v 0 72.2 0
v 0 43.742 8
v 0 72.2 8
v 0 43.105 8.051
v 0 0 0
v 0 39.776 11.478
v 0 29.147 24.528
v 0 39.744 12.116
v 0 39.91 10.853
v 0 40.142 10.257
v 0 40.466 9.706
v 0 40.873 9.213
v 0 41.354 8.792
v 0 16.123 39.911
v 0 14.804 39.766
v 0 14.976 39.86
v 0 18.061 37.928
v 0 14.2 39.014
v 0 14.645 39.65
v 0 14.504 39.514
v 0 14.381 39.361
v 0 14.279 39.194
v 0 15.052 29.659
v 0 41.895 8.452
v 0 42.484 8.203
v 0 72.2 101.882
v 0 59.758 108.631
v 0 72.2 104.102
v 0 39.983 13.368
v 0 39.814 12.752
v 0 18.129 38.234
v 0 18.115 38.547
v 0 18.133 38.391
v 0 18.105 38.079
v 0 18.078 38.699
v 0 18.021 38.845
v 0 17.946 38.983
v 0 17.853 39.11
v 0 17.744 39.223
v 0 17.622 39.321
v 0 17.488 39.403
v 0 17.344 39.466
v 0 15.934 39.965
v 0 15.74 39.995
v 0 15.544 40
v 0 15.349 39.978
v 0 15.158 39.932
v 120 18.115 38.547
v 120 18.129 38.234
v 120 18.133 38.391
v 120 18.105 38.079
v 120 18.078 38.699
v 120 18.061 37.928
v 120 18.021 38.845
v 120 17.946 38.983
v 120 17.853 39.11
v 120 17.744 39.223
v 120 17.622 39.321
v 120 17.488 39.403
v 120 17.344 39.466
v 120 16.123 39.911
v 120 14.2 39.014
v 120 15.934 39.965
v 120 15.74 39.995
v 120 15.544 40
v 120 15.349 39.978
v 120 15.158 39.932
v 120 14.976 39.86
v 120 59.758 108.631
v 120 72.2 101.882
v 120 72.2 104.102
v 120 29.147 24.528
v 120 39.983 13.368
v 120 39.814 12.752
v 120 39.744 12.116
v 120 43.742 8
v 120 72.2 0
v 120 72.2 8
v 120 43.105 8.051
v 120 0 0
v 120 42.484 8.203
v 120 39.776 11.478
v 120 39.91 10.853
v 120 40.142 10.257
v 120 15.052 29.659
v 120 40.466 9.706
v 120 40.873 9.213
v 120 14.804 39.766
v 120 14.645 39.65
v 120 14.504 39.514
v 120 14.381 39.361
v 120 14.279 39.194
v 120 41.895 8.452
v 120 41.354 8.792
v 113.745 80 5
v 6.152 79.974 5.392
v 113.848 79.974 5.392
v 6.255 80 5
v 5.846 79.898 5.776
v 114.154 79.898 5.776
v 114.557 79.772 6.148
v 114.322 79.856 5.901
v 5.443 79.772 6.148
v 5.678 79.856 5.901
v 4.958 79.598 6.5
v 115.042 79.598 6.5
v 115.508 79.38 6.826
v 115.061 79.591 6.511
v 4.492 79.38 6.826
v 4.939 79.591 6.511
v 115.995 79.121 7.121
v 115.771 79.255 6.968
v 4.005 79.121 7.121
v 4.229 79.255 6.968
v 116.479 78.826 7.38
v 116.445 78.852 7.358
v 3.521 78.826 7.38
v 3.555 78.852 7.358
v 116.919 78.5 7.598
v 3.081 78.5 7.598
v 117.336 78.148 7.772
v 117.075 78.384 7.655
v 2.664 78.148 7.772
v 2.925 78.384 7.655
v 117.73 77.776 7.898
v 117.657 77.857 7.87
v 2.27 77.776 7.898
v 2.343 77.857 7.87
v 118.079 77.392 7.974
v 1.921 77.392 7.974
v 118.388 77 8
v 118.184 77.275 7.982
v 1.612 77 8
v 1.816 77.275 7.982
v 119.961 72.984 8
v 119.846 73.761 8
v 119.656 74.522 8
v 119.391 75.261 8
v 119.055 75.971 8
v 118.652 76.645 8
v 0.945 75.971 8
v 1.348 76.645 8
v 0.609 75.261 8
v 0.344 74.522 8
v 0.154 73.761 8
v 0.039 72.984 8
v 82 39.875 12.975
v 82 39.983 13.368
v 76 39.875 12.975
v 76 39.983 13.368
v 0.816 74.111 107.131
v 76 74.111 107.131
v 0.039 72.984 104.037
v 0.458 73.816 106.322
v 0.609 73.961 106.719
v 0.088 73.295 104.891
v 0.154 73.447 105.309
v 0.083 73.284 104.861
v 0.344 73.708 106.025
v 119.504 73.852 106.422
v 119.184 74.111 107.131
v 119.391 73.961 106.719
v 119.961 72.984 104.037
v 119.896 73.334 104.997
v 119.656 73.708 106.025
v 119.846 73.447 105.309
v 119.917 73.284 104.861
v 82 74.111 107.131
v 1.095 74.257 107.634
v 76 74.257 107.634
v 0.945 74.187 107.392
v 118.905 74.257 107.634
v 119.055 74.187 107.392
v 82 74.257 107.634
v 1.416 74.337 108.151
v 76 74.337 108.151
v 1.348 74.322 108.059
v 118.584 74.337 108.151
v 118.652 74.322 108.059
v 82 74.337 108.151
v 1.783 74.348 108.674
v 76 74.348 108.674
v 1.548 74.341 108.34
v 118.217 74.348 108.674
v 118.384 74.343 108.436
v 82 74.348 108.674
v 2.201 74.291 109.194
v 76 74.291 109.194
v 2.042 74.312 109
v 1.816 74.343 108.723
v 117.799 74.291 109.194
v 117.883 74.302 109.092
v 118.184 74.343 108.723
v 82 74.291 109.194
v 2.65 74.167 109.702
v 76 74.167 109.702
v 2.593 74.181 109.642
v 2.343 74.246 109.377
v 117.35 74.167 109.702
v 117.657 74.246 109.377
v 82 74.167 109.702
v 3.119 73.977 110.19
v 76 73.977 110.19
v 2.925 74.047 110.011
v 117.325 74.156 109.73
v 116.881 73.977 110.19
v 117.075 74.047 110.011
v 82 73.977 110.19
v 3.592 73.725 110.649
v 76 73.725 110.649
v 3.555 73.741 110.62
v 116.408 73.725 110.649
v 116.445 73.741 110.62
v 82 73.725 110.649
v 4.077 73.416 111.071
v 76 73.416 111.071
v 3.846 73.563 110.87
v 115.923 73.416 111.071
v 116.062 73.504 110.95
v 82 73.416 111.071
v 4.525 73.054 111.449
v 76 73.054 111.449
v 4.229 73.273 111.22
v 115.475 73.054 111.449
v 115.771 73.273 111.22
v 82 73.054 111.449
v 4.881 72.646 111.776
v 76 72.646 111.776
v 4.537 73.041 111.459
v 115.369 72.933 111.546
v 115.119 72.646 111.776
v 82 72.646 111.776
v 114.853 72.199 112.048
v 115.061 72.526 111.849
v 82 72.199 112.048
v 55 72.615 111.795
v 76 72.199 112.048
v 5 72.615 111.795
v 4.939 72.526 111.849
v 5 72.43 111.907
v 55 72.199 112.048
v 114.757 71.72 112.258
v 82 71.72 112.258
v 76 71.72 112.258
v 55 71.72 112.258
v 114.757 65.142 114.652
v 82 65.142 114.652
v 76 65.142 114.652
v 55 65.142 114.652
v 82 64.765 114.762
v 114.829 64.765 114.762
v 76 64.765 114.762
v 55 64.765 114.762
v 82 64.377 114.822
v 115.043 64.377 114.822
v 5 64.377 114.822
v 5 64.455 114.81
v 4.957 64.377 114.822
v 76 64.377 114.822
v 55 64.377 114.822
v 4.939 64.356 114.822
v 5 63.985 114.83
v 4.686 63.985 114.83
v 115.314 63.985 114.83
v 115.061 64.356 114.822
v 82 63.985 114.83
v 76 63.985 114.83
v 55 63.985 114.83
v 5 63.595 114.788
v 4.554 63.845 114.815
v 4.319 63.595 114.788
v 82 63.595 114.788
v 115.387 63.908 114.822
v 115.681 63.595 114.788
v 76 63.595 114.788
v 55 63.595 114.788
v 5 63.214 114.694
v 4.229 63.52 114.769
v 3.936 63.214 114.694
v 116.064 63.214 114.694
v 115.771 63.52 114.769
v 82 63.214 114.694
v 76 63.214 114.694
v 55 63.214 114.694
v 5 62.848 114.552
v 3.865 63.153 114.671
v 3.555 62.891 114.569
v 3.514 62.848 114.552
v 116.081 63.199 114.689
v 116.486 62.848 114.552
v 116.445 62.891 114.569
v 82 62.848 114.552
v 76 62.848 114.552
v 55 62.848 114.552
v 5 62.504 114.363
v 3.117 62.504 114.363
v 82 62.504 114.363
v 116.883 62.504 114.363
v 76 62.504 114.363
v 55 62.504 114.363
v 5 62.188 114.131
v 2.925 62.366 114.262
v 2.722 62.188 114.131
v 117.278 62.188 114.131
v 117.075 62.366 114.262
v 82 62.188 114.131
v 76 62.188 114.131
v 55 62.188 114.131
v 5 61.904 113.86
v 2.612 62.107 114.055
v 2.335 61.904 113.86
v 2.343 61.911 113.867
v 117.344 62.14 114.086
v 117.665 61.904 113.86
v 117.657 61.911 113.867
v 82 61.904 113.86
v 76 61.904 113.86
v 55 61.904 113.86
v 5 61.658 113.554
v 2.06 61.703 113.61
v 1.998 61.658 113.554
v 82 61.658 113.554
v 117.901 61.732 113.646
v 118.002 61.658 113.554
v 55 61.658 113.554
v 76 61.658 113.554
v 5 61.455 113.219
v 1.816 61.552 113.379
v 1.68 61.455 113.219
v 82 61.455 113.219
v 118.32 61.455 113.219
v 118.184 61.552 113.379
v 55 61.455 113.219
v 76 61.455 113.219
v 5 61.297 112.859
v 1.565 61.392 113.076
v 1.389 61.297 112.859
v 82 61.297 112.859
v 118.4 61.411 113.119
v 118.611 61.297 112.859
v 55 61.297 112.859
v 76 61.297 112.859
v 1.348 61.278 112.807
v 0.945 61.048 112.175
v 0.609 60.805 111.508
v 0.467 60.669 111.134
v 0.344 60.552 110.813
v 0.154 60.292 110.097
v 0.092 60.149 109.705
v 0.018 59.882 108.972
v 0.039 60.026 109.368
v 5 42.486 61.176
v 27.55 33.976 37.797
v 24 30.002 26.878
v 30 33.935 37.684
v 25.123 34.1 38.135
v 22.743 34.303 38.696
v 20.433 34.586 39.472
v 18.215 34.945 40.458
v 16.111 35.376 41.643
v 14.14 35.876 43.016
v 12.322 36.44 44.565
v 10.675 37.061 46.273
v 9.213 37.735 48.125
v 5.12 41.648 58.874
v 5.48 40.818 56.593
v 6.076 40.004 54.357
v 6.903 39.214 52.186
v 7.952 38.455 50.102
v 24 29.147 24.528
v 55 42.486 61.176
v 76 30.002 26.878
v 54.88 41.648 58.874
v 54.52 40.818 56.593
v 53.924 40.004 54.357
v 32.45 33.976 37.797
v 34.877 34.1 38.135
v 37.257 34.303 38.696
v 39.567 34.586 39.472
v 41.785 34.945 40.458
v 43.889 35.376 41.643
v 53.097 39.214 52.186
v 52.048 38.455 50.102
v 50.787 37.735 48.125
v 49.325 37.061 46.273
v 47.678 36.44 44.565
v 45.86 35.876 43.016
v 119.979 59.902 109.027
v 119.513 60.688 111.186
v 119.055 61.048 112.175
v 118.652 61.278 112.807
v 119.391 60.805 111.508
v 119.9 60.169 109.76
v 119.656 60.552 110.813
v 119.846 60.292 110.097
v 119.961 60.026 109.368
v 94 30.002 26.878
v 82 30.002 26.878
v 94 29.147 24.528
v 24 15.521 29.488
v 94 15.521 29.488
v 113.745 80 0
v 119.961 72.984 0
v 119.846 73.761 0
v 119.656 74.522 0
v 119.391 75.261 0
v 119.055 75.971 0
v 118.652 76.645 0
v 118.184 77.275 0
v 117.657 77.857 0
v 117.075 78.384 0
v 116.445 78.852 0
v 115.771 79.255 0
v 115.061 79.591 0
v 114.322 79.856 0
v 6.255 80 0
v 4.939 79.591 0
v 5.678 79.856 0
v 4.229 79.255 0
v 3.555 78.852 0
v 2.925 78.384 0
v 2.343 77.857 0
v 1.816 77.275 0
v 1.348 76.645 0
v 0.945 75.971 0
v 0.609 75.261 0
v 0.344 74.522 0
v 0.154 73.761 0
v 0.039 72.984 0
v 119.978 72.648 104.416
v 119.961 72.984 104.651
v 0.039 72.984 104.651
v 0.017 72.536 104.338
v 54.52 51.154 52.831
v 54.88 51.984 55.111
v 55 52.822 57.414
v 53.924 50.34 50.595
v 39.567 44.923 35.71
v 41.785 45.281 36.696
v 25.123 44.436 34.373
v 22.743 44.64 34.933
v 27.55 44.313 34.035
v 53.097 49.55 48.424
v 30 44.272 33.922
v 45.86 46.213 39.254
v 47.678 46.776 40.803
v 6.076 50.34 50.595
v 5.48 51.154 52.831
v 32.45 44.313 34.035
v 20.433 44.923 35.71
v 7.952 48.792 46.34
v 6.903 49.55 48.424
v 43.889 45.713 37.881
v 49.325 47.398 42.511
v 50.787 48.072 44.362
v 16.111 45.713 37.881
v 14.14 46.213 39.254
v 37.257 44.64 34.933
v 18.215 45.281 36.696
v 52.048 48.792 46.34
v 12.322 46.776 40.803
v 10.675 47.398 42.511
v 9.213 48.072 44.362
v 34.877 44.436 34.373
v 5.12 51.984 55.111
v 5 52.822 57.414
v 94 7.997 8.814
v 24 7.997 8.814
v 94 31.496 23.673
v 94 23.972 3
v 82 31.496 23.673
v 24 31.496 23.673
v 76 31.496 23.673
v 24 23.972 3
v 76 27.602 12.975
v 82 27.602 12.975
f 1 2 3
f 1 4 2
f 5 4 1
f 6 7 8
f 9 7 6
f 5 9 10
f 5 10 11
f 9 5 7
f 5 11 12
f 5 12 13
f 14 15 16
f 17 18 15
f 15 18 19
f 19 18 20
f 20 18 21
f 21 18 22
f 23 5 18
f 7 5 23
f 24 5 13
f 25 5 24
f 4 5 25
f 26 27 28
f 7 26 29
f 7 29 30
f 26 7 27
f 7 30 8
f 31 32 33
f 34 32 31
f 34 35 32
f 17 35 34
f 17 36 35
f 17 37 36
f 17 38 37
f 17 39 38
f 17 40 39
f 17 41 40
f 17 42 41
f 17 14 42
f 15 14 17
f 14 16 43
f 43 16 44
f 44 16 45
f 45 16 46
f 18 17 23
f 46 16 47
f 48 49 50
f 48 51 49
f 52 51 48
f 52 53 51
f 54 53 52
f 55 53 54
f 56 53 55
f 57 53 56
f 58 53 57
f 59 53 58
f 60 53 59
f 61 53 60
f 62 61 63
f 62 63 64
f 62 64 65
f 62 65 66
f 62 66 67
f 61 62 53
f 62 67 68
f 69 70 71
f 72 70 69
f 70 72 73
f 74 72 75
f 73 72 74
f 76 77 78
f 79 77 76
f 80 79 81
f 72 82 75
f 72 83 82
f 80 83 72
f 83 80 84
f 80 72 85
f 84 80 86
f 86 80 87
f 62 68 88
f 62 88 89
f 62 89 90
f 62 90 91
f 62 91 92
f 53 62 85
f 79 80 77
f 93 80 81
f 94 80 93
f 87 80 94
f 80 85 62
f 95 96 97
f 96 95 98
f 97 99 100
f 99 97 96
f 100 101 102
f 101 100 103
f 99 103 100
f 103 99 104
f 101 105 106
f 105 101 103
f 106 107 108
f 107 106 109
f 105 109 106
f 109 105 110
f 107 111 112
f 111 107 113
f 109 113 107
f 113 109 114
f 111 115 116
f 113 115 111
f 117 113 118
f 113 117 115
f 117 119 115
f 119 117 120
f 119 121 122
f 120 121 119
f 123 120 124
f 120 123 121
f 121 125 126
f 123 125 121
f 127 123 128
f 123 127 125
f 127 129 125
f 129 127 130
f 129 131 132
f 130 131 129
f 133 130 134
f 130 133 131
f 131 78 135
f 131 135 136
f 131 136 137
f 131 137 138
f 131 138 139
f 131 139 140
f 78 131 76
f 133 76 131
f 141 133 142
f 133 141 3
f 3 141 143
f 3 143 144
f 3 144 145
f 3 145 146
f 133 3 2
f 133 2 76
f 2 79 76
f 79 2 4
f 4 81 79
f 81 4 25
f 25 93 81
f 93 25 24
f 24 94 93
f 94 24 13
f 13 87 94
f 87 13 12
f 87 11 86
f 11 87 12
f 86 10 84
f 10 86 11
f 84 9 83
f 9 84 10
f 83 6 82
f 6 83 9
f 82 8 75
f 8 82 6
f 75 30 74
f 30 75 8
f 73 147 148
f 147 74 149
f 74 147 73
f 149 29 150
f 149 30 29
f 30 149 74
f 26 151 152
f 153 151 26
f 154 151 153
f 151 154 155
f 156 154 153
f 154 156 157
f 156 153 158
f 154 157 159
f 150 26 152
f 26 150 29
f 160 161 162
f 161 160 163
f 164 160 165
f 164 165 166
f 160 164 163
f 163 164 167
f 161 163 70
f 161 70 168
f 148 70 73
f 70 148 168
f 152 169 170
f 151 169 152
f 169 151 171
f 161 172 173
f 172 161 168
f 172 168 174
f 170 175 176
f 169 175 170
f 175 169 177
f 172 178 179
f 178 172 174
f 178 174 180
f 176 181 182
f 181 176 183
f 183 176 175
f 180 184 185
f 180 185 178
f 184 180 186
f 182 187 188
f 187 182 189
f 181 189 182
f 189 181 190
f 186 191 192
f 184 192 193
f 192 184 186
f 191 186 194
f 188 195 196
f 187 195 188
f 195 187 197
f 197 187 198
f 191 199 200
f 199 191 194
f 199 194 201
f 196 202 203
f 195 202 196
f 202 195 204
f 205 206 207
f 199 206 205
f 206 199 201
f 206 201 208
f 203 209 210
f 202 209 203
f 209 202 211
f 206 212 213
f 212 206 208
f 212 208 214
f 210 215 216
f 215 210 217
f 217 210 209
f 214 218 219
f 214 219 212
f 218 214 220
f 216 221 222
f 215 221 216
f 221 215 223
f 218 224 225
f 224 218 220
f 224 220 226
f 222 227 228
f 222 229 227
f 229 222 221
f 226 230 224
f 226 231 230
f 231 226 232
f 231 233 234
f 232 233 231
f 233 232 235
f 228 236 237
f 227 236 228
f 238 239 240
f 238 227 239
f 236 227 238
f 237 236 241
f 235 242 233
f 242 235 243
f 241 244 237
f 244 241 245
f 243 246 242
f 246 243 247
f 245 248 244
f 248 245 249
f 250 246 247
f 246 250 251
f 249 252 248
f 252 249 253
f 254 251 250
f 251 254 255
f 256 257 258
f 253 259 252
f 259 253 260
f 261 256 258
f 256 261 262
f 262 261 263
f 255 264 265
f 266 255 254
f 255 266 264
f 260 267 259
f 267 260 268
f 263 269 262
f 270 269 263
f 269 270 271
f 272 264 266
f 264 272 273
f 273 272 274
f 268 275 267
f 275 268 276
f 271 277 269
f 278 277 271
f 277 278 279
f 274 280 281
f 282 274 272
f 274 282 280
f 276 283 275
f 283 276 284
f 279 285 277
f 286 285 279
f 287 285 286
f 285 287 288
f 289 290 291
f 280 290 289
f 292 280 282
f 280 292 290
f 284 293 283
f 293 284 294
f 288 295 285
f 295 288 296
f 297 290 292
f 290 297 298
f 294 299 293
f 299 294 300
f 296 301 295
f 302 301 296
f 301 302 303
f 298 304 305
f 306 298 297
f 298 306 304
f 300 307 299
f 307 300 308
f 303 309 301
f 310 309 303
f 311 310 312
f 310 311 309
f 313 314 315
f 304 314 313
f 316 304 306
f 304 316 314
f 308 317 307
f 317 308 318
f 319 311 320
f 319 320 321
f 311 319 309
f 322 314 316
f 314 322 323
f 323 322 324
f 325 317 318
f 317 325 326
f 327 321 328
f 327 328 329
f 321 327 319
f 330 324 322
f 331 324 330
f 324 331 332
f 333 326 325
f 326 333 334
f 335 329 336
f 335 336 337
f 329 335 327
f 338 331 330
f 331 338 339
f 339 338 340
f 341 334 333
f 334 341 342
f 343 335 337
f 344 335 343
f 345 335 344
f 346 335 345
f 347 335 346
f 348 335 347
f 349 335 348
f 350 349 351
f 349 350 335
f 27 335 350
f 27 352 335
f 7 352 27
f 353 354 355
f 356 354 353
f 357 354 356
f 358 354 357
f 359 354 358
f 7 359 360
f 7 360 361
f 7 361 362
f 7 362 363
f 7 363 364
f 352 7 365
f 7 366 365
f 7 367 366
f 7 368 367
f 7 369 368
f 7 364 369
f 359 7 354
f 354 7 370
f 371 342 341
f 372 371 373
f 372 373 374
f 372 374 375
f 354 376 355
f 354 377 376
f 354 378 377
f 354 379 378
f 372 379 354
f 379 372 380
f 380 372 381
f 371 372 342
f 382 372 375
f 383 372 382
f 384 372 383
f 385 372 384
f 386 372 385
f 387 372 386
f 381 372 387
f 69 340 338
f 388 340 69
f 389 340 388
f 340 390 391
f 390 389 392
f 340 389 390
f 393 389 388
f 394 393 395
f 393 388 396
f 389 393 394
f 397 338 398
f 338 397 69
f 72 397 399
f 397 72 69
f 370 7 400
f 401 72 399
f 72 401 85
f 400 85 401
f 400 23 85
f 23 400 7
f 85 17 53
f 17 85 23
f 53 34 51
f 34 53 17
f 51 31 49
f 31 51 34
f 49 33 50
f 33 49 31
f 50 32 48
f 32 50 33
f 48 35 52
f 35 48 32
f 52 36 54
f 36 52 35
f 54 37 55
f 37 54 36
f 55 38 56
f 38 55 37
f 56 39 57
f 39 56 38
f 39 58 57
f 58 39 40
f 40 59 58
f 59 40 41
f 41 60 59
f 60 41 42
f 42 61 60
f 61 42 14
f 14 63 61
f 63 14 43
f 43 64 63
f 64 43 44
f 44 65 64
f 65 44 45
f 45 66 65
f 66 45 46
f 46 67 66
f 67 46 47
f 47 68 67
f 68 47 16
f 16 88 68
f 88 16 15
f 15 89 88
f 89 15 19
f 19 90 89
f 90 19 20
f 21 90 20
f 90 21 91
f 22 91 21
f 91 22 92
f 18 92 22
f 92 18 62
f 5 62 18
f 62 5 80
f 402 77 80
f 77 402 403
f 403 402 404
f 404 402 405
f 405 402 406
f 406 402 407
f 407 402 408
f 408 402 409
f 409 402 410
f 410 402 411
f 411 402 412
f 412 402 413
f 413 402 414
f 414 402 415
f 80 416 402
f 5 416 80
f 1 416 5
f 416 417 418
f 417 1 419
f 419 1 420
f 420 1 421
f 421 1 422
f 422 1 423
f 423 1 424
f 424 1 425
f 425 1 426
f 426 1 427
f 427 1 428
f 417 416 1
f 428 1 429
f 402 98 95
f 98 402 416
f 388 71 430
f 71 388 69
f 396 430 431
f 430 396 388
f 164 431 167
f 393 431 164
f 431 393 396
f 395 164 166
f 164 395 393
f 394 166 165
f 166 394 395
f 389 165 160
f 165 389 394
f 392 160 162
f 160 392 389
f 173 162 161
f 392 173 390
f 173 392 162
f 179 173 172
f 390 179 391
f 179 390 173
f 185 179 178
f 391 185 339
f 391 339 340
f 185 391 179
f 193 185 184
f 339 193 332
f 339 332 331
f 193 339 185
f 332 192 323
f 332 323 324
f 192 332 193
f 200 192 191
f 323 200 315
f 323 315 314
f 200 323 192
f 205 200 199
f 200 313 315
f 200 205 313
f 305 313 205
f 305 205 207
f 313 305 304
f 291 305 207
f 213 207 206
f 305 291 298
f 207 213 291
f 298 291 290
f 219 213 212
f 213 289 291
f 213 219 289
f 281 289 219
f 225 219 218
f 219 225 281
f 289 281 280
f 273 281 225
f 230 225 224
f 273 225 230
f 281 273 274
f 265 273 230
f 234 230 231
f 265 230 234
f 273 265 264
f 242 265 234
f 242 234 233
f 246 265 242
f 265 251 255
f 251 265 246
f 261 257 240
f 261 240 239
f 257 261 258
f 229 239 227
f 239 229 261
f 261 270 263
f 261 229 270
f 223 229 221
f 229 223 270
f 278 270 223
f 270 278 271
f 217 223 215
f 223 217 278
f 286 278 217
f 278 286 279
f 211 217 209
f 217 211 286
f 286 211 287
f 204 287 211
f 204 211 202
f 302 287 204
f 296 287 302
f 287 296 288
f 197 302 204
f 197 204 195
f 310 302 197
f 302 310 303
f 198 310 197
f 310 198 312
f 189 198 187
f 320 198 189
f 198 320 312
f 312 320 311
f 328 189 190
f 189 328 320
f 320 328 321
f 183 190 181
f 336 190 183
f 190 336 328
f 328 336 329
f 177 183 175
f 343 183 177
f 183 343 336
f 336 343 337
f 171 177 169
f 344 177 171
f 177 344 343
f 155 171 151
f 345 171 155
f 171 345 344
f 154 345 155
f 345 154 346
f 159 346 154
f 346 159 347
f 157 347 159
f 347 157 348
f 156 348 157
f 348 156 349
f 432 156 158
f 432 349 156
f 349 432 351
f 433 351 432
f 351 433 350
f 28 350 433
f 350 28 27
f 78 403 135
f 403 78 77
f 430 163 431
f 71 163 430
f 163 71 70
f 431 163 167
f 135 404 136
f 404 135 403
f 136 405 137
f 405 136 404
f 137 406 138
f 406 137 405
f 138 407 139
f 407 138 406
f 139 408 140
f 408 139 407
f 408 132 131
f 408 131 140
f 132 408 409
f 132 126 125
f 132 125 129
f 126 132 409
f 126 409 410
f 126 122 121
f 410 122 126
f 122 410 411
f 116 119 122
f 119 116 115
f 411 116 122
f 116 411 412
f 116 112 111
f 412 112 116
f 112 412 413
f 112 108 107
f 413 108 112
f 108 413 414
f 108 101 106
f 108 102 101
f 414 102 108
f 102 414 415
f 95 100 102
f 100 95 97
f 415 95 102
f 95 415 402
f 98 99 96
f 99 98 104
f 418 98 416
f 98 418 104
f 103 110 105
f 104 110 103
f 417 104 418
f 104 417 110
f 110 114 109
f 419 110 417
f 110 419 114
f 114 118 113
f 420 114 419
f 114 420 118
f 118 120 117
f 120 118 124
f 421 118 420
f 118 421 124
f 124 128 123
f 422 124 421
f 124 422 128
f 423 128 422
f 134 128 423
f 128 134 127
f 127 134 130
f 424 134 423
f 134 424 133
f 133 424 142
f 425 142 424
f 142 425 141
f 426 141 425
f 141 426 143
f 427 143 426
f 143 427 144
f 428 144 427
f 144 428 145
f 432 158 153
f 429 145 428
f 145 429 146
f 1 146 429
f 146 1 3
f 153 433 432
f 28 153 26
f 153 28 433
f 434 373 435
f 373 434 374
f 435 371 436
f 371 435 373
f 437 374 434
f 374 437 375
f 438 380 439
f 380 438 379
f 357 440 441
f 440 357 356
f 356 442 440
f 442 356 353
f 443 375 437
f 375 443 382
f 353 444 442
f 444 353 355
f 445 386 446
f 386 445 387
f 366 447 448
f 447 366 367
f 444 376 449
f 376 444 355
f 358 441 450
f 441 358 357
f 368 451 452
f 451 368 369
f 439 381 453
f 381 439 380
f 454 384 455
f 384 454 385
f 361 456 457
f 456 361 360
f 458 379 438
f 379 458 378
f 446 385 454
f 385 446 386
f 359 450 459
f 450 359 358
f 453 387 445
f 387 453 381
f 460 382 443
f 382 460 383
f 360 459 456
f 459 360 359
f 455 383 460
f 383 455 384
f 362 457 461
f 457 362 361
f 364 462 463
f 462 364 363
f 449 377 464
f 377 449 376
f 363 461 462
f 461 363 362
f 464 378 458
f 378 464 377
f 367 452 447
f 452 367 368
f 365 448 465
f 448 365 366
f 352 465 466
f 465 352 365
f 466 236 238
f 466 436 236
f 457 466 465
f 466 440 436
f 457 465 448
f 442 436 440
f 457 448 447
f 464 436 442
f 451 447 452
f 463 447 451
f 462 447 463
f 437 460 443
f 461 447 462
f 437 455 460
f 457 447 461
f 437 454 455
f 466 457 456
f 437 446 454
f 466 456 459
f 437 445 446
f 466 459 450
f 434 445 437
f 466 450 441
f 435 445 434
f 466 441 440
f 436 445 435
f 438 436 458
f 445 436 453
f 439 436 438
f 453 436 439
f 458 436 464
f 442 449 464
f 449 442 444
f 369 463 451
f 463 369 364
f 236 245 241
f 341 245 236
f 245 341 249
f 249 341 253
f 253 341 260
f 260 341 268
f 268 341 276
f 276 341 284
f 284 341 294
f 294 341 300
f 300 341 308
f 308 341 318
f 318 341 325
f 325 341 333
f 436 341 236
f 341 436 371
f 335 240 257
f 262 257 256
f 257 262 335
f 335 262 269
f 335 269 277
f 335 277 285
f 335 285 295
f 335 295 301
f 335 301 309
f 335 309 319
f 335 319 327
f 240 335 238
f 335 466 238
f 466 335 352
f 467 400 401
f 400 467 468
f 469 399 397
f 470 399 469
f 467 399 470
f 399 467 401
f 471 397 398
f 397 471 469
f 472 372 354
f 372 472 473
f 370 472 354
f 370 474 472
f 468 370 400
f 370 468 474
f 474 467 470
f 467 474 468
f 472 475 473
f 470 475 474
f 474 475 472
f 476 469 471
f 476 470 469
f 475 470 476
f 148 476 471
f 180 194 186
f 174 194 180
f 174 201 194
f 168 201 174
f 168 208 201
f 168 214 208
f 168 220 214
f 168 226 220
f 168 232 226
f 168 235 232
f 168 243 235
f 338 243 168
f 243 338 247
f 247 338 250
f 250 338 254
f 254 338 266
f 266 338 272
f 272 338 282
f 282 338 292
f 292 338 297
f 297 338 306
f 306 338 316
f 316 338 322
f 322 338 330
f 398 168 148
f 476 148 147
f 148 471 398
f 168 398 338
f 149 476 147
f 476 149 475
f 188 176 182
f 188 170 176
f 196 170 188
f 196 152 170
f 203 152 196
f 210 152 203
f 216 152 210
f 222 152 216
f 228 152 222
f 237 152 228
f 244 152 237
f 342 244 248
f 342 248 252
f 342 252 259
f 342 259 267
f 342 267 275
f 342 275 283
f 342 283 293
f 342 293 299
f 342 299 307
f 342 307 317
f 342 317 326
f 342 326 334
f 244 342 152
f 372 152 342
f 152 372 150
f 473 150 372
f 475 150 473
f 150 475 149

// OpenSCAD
// Ladeständer für PocketBook Era Color (mit Hülle + Popsocket), Gerät quer,
// Ladebuchse unten, gewinkelter USB-C-Stecker hängt frei in einem Schacht
// Alle Maße in Millimetern (Regel: units-mm)
//
// Änderungen gegenüber _001 (QA-Befunde + Nutzerwunsch "abgerundete Ecken"):
//   - Befund 1: Kante hinten am Schacht (Stütze hing 2.5 mm über) mit 45° im
//     Gerätesystem angefast -> ~25° aus der Senkrechten, kein Überhang mehr.
//   - Befund 2: back_h 95 -> 97, damit R10 auch senkrecht gilt (97 * sin70 = 91.2).
//   - Befund 3/4: Reserve. shaft_d 20 -> 22, Popsocket-Luft seitlich/unten
//     3 -> 5 (Tasche 50 breit), hinten 2 -> 4 (Tasche 11 tief), dafür
//     back_t 12 -> 14 (Rest hinter der Tasche bleibt 3). Tasche unten rund
//     (U-Form, folgt dem Popsocket).
//   - Befund 6: Ständermasse zieht Schacht, Kanal und Tasche ab (vorher nur
//     die volle Profilfläche).
//   - Abgerundet: Profilecken (Lippe oben, Stützenkopf, Fußplatte hinten,
//     Hohlkehle Stütze/Fußplatte), Stützenkopf seitlich (Vorderansicht),
//     hintere Ecken der Fußplatte (Draufsicht). Nicht gerundet: Kanten am
//     Bett (kein Überhang am Fuß) und die Auflage/Schlitzecken (dort sitzt
//     die Gerätekante).
//
// Kontext (Regel: context-first):
//   - context/printer.md:    Anycubic Kobra S1, 0.4mm Düse, PEI, 250mm Bauraum
//   - context/tolerances.md: kein Passsitz im Teil. Geräteschlitz bewusst
//                            locker (+1 mm/Seite), Stecker/Kabel mit viel Luft.
//   - context/materials.md:  PLA, Rechenwerte (Dichte 1.24, Füllung ~0.6)
//
// ---------------------------------------------------------------------------
// ANFORDERUNGSTABELLE (Design-Gespräch, vom Nutzer bestätigt)
// ---------------------------------------------------------------------------
// | ID  | Anforderung                         | Soll                                   | Quelle        | Prüfmethode                          |
// |-----|-------------------------------------|----------------------------------------|---------------|--------------------------------------|
// | R1  | Gerät quer: 162 br. x 145 h x 13 d  | Aufnahme passend, Gerät darf seitlich   | 145 gemessen, | Bounding Box, Schnitte               |
// |     |                                     | überstehen                             | 162 geschätzt,|                                      |
// |     |                                     |                                        | 13 ca. gem.   |                                      |
// | R2  | Schlitz für die Dicke               | 15 mm (+1/-0), locker                  | ca. gemessen  | Schnitt quer                         |
// | R3  | Neigung                             | 70° ±1° gegen den Tisch                | Nutzer        | Schnitt quer, Winkel                 |
// | R4  | Gerät auf zwei Auflagen, nicht auf  | Schacht unter der Buchse 70 mm lang (X)| angenommen    | Schnitt z = Auflagehöhe              |
// |     | dem Stecker                         | x 17 mm tief (quer zum Gerät)          |               |                                      |
// | R5  | Buchsenposition                     | Mitte ~80 mm vom linken Ende, mittig   | geschätzt     | Schacht zentriert darauf             |
// |     |                                     | in der Dicke                           |               |                                      |
// | R6  | Freiraum Winkelstecker              | Schachttiefe unter dem Gerät >= 20 mm  | angenommen    | Schnitt, Kollisionsteil Stecker      |
// |     |                                     | (Stecker ~15 lang, 12 x 7)             |               |                                      |
// | R7  | Kabelkanal oben offen, nach hinten  | Breite >= 5 mm, Kabel von oben einlegbar| angenommen   | Schnitt, Sichtprüfung                |
// | R8  | Popsocket frei: Ø40 x 7, Mitte 39   | Aussparung >= Ø46, Tiefe >= 9          | geschätzt     | Schnitt, Kollisionsteil              |
// |     | über Unterkante, 51 vom linken Ende |                                        |               |                                      |
// | R9  | Lippe vorne hält die Unterkante     | ~10 mm hoch                            | angenommen    | Schnitt quer                         |
// | R10 | Rückenstütze trägt über dem Schwer- | Anlage bis >= 90 mm über Unterkante    | angenommen    | Schnitt quer                         |
// |     | punkt                               |                                        |               |                                      |
// | R11 | Kippsicher, nur Laden               | Kippwinkel vorne und hinten >= 15°,    | angenommen    | echo(), load-case-check              |
// |     |                                     | mit 330 g                              |               |                                      |
// | R12 | PLA, ohne Stützen druckbar          | Überhang <= 45°, Wände >= 0.8 mm       | Nutzer        | G4                                   |
// | R13 | Druckraum                           | <= 250 x 250 x 250                     | Drucker       | Bounding Box                         |
// | R14 | Teile im print                      | 1 Volumen                              | -             | check.py Volumes                     |
// | R15 | Passtest                            | Teil fit_test: Sockelausschnitt mit    | -             | Druck vor dem ganzen Teil            |
// |     |                                     | Schacht, Kanal, Auflagen               |               |                                      |
// | R16 | Abgerundete Ecken (Nutzer, _002)    | sichtbare Außenecken gerundet, Bett-   | Nutzer        | Sichtprüfung (G3), Schnitt quer      |
// |     |                                     | kanten und Auflage/Schlitz scharf      |               |                                      |
//
// Stecker: UGREEN 60W USB-C Winkel 90°. Herstellermaße nicht gefunden ->
// plug_* und cable_d sind ANNAHMEN. Annahme: das Kabel geht parallel zur
// Geräteunterkante ab (X). Steckerseite so wählen, dass es nach rechts
// (zum Kanal) abgeht – USB-C ist verdrehbar.
//
// ---------------------------------------------------------------------------
// Koordinaten
// ---------------------------------------------------------------------------
// X = Breite (x = 0 am linken Ende des Geräts, von vorne gesehen),
// Y = Tiefe (y = 0 Vorderkante Fuß, +Y nach hinten), Z = Höhe.
// Gerätesystem (n, u): u entlang der Gerätefläche nach oben (um tilt nach
// hinten geneigt), n senkrecht dazu nach hinten. Ursprung O = Schnitt von
// Lippen-Innenseite und Auflage. Der Schlitz reicht von n = 0 (Lippe) bis
// n = slot_w (Rückenstütze); das Gerät lehnt an der Stütze.
//
// Aufbau: ein Profil in (Y, Z), über stand_w in X extrudiert:
//   Fuß vorne (massiv unter dem Schlitz), Lippe, Auflage senkrecht zur
//   Gerätefläche, geneigte Rückenstütze als Platte, flache Fußplatte nach
//   hinten. Ausgeschnitten: Steckerschacht unter der Buchse, Kabelkanal
//   (oben offen) nach hinten, Popsocket-Tasche (oben offen) in der Stütze.
//
// Druckausrichtung (part = "print"): so wie er steht, Fußunterseite aufs
// Bett. Keine Brücken (Schacht, Kanal und Tasche sind oben offen). Stärkster
// Überhang: Lippen-Innenseite und Rückseite der Stütze, je tilt = 20° aus
// der Senkrechten.
//
// LASTFÄLLE (rule load-case-check): Das Teil wird nicht bedient, nur
// abgestellt. Bruch unkritisch (330 g auf ~12 mm PLA-Platte, Spannungen
// << 1 MPa). Rutschen unkritisch (Lippe hält formschlüssig). Maßgebend ist
// Kippen, nach hinten (Anstoßen an der Geräteoberkante). echo() unten.

/* [Gerät] */
// Breite quer (lange Kante, mit Hülle) – GESCHÄTZT
dev_w = 162;
// Höhe quer (kurze Kante, mit Hülle) – gemessen
dev_h = 145;
// Dicke mit Hülle, ohne Popsocket – ca. gemessen
dev_t = 13;
// Masse Gerät + Hülle in g – ANNAHME (nur echo)
dev_mass_g = 330;

/* [Popsocket (Rückseite, eingeklappt)] */
pop_d = 40;
pop_h = 7;
// Mitte vom linken Ende (Frontansicht)
pop_x = 51;
// Mitte über der Geräteunterkante
pop_u = 39;
// Luft ringsum in der Tasche
pop_clear = 5;
// Luft hinter dem Popsocket
pop_clear_back = 4;

/* [Buchse und Winkelstecker – ANNAHMEN] */
// Buchsenmitte vom linken Ende
port_x = 80;
// Steckergehäuse: Breite (X), Dicke (n), Länge aus dem Gerät
plug_w = 12;
plug_t = 7;
plug_l = 15;
cable_d = 4;

/* [Ständer] */
// Neigung gegen den Tisch
stand_angle = 70;
// Luft im Schlitz gesamt (Schlitz = dev_t + slot_clear)
slot_clear = 2;
// Breite des Ständers (X), mittig unter dem Gerät
stand_w = 120;
// Lippe vorne: Dicke, Höhe über der Auflage
lip_t = 4;
lip_h = 10;
// Rückenstütze: Anlagehöhe über der Auflage, Plattendicke
back_h = 97;
back_t = 14;
// Fußplatte hinten: Gesamttiefe des Fußes, Höhe
base_d = 80;
base_h = 8;
// Boden unter dem tiefsten Punkt des Schachts
floor_t = 3;

/* [Schacht und Kanal] */
shaft_l = 70;
shaft_w = 17;
shaft_d = 22;
// Kanal nach hinten: X-Position (rechts neben dem Stecker, Platz zum Biegen)
channel_x = 100;
channel_w = 6;

/* [Ansicht] */
part = "print"; // [print, stand, fit_test, assembly, interference]

/* [Hidden] */
nozzle = 0.4;
min_w = 2 * nozzle;
bed = 250;
rho_pla = 1.24;   // g/cm³
fill = 0.6;       // effektive Füllung für Massenschätzung
eps = 0.01;
col_stand = "MidnightBlue";
$fn = 64;

tilt = 90 - stand_angle;       // Neigung aus der Senkrechten
s = sin(tilt);
c = cos(tilt);
slot_w = dev_t + slot_clear;
n_dev0 = slot_w - dev_t;       // Gerät lehnt an der Stütze
n_plug = n_dev0 + dev_t / 2;   // Buchse mittig in der Dicke
// Schachtvorderwand nie genau in der Ebene der Lippen-Innenseite (n = 0):
// koplanare Flächen ergeben Null-Dreiecke in der STL (F7)
shaft_n0 = max(n_plug - shaft_w / 2, 0.5);
shaft_n1 = shaft_n0 + shaft_w;
n_rear = slot_w + back_t;      // Rückseite der Stütze
sx0 = (dev_w - stand_w) / 2;   // Ständer mittig unter dem Gerät
sx1 = sx0 + stand_w;

// Ursprung O: tiefster Schachtpunkt (n = shaft_n1, u = -shaft_d) liegt auf
// z = floor_t; Lippen-Vorderkante trifft den Tisch bei y = 0.
Oz = floor_t + shaft_n1 * s + shaft_d * c;
u_a = -(Oz + lip_t * s) / c;
Oy = lip_t * c - u_a * s;

function F(n, u) = [Oy + n * c + u * s, Oz - n * s + u * c];

u_J = (base_h - Oz + n_rear * s) / c;   // Stützen-Rückseite trifft Fußplatte
PROFILE = [
    [0, 0], [base_d, 0], [base_d, base_h],
    F(n_rear, u_J), F(n_rear, back_h), F(slot_w, back_h),
    F(slot_w, 0), F(0, 0), F(0, lip_h), F(-lip_t, lip_h)
];
// Eckradien je Profilpunkt (R16). 0 = scharf: Bettkanten (kein Überhang)
// und Auflage/Schlitz (dort sitzt die Gerätekante). J = Hohlkehle.
//            A  R1 R2 J  H  G  E  D  C    B
PROFILE_RAD = [0, 0, 3, 4, 4, 3, 0, 0, 1.2, 1.5];
// Seitliche Rundung Stützenkopf (Vorderansicht), hintere Fußecken (Draufsicht)
top_corner_r = 8;
foot_corner_r = 8;

// Ecke i mit Radius r durch einen Kreisbogen ersetzen (konvex und konkav)
function unit(v) = v / norm(v);
function round_corner(P, i, r, k = 12) =
    let(a = P[(i - 1 + len(P)) % len(P)], p = P[i], b = P[(i + 1) % len(P)],
        u1 = unit(a - p), u2 = unit(b - p),
        th = acos(u1 * u2) / 2,
        t = r / tan(th),
        C = p + unit(u1 + u2) * r / sin(th),
        T1 = p + u1 * t, T2 = p + u2 * t,
        a1 = atan2(T1[1] - C[1], T1[0] - C[0]),
        a2 = atan2(T2[1] - C[1], T2[0] - C[0]),
        d0 = a2 - a1,
        d = d0 > 180 ? d0 - 360 : (d0 < -180 ? d0 + 360 : d0))
    [for (j = [0 : k]) C + r * [cos(a1 + d * j / k), sin(a1 + d * j / k)]];
// Tangentenlänge je Ecke, für die Kontrolle "Radien passen auf die Kante"
function tan_len(P, i, r) =
    let(a = P[(i - 1 + len(P)) % len(P)], p = P[i], b = P[(i + 1) % len(P)])
    r / tan(acos(unit(a - p) * unit(b - p)) / 2);
function round_poly(P, R) =
    [for (i = [0 : len(P) - 1]) each (R[i] > 0 ? round_corner(P, i, R[i]) : [P[i]])];
PROFILE_R = round_poly(PROFILE, PROFILE_RAD);

// Kabel verlässt den Stecker knapp über dessen Ende, Kanalboden darunter
cab_u = -plug_l + cable_d / 2 + 1;
cab_P = F(n_plug, cab_u);
channel_z0 = cab_P[1] - cable_d / 2 - 0.5;
channel_y0 = F(0, lip_h)[0] + 0.5;      // hinter der Lippe, schneidet sie nicht

pocket_w = pop_d + 2 * pop_clear;
pocket_dep = pop_h + pop_clear_back;
pocket_x0 = pop_x - pocket_w / 2;
pocket_x1 = pop_x + pocket_w / 2;

// Polygonfläche und Schwerpunkt (Shoelace)
function sumv(v, i = 0) = i >= len(v) ? 0 : v[i] + sumv(v, i + 1);
function cr(P, i) = let(a = P[i], b = P[(i + 1) % len(P)]) a[0] * b[1] - b[0] * a[1];
function parea(P) = sumv([for (i = [0 : len(P) - 1]) cr(P, i)]) / 2;
function pcent(P) = let(A = parea(P)) [
    sumv([for (i = [0 : len(P) - 1]) (P[i][0] + P[(i + 1) % len(P)][0]) * cr(P, i)]) / (6 * A),
    sumv([for (i = [0 : len(P) - 1]) (P[i][1] + P[(i + 1) % len(P)][1]) * cr(P, i)]) / (6 * A)];
// Polygon an der Halbebene p[ax] >= k abschneiden (Sutherland-Hodgman)
function clip_ge(P, ax, k) =
    [for (i = [0 : len(P) - 1])
        let(p = P[i], q = P[(i + 1) % len(P)], pin = p[ax] >= k, qin = q[ax] >= k)
        each concat(pin ? [p] : [],
                    pin != qin ? [p + (q - p) * ((k - p[ax]) / (q[ax] - p[ax]))] : [])];

// Schacht mit 45°-Fase (Gerätesystem n, u): Rechteck unter der Auflage plus
// Dreieck hinten, das die überstehende Stützenkante abträgt (QA-Befund 1)
ch_d = shaft_n1 - slot_w;   // Überstand der Stütze über dem Schacht
SHAFT_NU = [[shaft_n0, -shaft_d], [shaft_n1, -shaft_d], [shaft_n1, 0],
            [slot_w, ch_d], [shaft_n0, ch_d]];
// Anteil des Schachts, der im Material liegt (ohne den leeren Schlitz)
SHAFT_MAT = [for (p = [[shaft_n0, -shaft_d], [shaft_n1, -shaft_d], [shaft_n1, 0],
                       [slot_w, ch_d], [slot_w, 0], [shaft_n0, 0]]) F(p[0], p[1])];

// ---------------------------------------------------------------------------
// Kontrollen
// ---------------------------------------------------------------------------
assert(abs(slot_w - 15) <= 1 && slot_w >= 15, str("R2: Schlitz ", slot_w));
assert(stand_angle >= 60 && stand_angle <= 80, "Neigung unplausibel");
assert(stand_w <= dev_w, "R1: Ständer breiter als das Gerät");
assert(shaft_n0 >= -eps && shaft_n1 <= n_rear - min_w, "Schacht ragt aus Lippe/Stütze");
assert(shaft_d >= plug_l + 5, str("R6: Schacht zu flach für den Stecker: ", shaft_d));
assert(shaft_w >= plug_t + 2 * 2 && shaft_w >= cable_d + 2 * 2, "Schacht zu schmal");
assert(port_x - shaft_l / 2 >= sx0 + 10 && port_x + shaft_l / 2 <= sx1 - 10,
       "R4: Auflagen neben dem Schacht < 10 mm");
assert(shaft_l / 2 - plug_w / 2 >= 8, "R5: Schacht deckt Lageunsicherheit ±8 nicht ab");
assert(channel_x + channel_w / 2 <= port_x + shaft_l / 2 - 2, "Kanal liegt nicht am Schacht");
assert(channel_x - channel_w / 2 >= port_x + plug_w / 2 + 4, "Kanal zu nah am Stecker (Biegung)");
assert(channel_w >= cable_d + 1 && channel_w >= 5, "R7: Kanal zu schmal");
assert(channel_z0 >= floor_t, str("Kanalboden unter Bodenstärke: ", channel_z0));
assert(pocket_x0 >= sx0 + 2 * min_w, "Popsocket-Tasche schneidet die linke Ständerkante");
assert(pocket_x1 <= channel_x - channel_w / 2 - 2 * min_w, "Tasche zu nah am Kanal");
assert(back_t - pocket_dep >= 2 * min_w, str("Rest hinter der Tasche: ", back_t - pocket_dep));
assert(pop_u - pocket_w / 2 > 0 && pop_u + pocket_w / 2 < dev_h, "Popsocket außerhalb Gerät");
assert(back_h >= 90 && back_h < dev_h, "R10: Anlagehöhe");
assert(lip_t >= 2 * min_w && lip_h >= 8, "R9: Lippe");
assert(F(n_rear, u_J)[0] < base_d - 10, "Fußplatte hinter der Stütze zu kurz");
for (i = [0 : len(PROFILE) - 1]) if (PROFILE_RAD[i] > 0) {
    // Tangentenlängen benachbarter Ecken dürfen sich auf einer Kante nicht
    // überschneiden, sonst läuft die Kontur zurück
    j = (i + 1) % len(PROFILE);
    assert(tan_len(PROFILE, i, PROFILE_RAD[i]) + tan_len(PROFILE, j, PROFILE_RAD[j])
           <= norm(PROFILE[j] - PROFILE[i]) - 0.2, str("R16: Radius an Ecke ", i, " zu groß"));
    k = (i - 1 + len(PROFILE)) % len(PROFILE);
    assert(tan_len(PROFILE, i, PROFILE_RAD[i]) + tan_len(PROFILE, k, PROFILE_RAD[k])
           <= norm(PROFILE[k] - PROFILE[i]) - 0.2, str("R16: Radius an Ecke ", i, " zu groß"));
}
assert(top_corner_r < pocket_x0 - sx0 + pocket_w / 2 && foot_corner_r < base_d - F(n_rear, u_J)[0],
       "Eckradien zu groß");
// Fase: Fläche im Gerätesystem 45° -> Winkel aus der Senkrechten in Weltkoordinaten
chamfer_vert = atan((ch_d * c - ch_d * s) / (ch_d * s + ch_d * c));
assert(chamfer_vert <= 45, str("R12: Schachtfase ", chamfer_vert, "° aus der Senkrechten"));
assert(max([for (p = PROFILE) p[0]]) <= bed && stand_w <= bed &&
       max([for (p = PROFILE) p[1]]) <= bed, "R13: größer als Bauraum");

// ---------------------------------------------------------------------------
// Kippen (R11). Konservativ: nur Gerät. Zusätzlich mit Ständermasse:
// Profil x Breite minus Schacht, Kanal und Tasche (QA-Befund 6). Die
// Eckrundungen in Vorder- und Draufsicht sind vernachlässigt (< 1 cm³).
// ---------------------------------------------------------------------------
function vol_cg(A, cg, w) = [abs(A) * w, cg];   // [mm³, [y, z]]
V_prof = vol_cg(parea(PROFILE_R), pcent(PROFILE_R), stand_w);
V_shaft = vol_cg(parea(SHAFT_MAT), pcent(SHAFT_MAT), shaft_l);
CH_PROF = clip_ge(clip_ge(PROFILE_R, 0, channel_y0), 1, channel_z0);
CH_SHAFT = clip_ge(clip_ge(SHAFT_MAT, 0, channel_y0), 1, channel_z0);
V_ch = [channel_w * (abs(parea(CH_PROF)) - abs(parea(CH_SHAFT))),
        (pcent(CH_PROF) * abs(parea(CH_PROF)) - pcent(CH_SHAFT) * abs(parea(CH_SHAFT)))
            / (abs(parea(CH_PROF)) - abs(parea(CH_SHAFT)))];
pr = pocket_w / 2;
pA1 = pocket_w * (back_h - pop_u);
pA2 = PI * pr * pr / 2;
p_uc = (pA1 * (pop_u + back_h) / 2 + pA2 * (pop_u - 4 * pr / (3 * PI))) / (pA1 + pA2);
V_pocket = [(pA1 + pA2) * pocket_dep, F(slot_w + pocket_dep / 2, p_uc)];
st_vol = V_prof[0] - V_shaft[0] - V_ch[0] - V_pocket[0];
st_cg = (V_prof[1] * V_prof[0] - V_shaft[1] * V_shaft[0] - V_ch[1] * V_ch[0]
         - V_pocket[1] * V_pocket[0]) / st_vol;
st_mass_g = st_vol / 1000 * rho_pla * fill;
dev_cg = F(n_dev0 + dev_t / 2, dev_h / 2);
tot_mass = dev_mass_g + st_mass_g;
tot_cg = (dev_cg * dev_mass_g + st_cg * st_mass_g) / tot_mass;
dev_top = F(n_dev0, dev_h);
tip_f_dev = atan(dev_cg[0] / dev_cg[1]);
tip_b_dev = atan((base_d - dev_cg[0]) / dev_cg[1]);
tip_f_tot = atan(tot_cg[0] / tot_cg[1]);
tip_b_tot = atan((base_d - tot_cg[0]) / tot_cg[1]);
push_b_g = tot_mass * (base_d - tot_cg[0]) / dev_top[1];   // horizontal an der Geräteoberkante
assert(tip_f_dev >= 15 && tip_b_dev >= 15,
       str("R11: Kippwinkel (nur Gerät) vorne ", tip_f_dev, "° hinten ", tip_b_dev, "°"));

echo(str("Schlitz ", slot_w, " mm, Neigung ", stand_angle, "°, Auflage auf z = ", Oz, " (vorne) bis ", F(slot_w, 0)[1]));
echo(str("Ständer: ", stand_w, " x ", base_d, " x ", max([for (p = PROFILE_R) p[1]]), " mm, Volumen ~",
         st_vol / 1000, " cm³, Masse ~", st_mass_g, " g (Füllung ", fill, ", Schätzung)"));
echo(str("Schacht ", shaft_l, " x ", shaft_w, " x ", shaft_d, ", Fase ", ch_d, " mm, ", chamfer_vert, "° aus der Senkrechten"));
echo(str("Tasche ", pocket_w, " breit, ", pocket_dep, " tief, Boden bei u = ", pop_u - pocket_w / 2,
         "; Stütze senkrecht ", F(slot_w, back_h)[1] - F(slot_w, 0)[1], " mm über der Auflage"));
echo(str("Kippen nur Gerät: vorne ", tip_f_dev, "°, hinten ", tip_b_dev, "°"));
echo(str("Kippen mit Ständer: vorne ", tip_f_tot, "°, hinten ", tip_b_tot, "°"));
echo(str("Schub an der Geräteoberkante nach hinten bis Kippen: ~", push_b_g, " g"));
echo(str("Kanal: x = ", channel_x, ", Boden z = ", channel_z0, ", Rest hinter Tasche ", back_t - pocket_dep, " mm"));

// ---------------------------------------------------------------------------
// Geometrie
// ---------------------------------------------------------------------------
// Gerätesystem: lokal x -> X, y -> n, z -> u
module in_dev() {
    multmatrix([[1, 0, 0, 0], [0, c, s, Oy], [0, -s, c, Oz], [0, 0, 0, 1]]) children();
}

module profile_solid() {
    translate([sx0, 0, 0]) rotate([90, 0, 90])
        linear_extrude(height = stand_w) polygon(PROFILE_R);
}

// Stützenkopf seitlich gerundet, Vorderansicht (x, u). Bogenmitte 0.5 über
// der Oberkante, damit keine Fläche genau auf der Kopffläche liegt (F7).
module top_round_2d() {
    r = top_corner_r;
    translate([sx0 - 10, -200]) square([stand_w + 20, 200 + back_h + 0.5 - r]);
    hull() {
        translate([sx0 + r, back_h + 0.5 - r]) circle(r = r);
        translate([sx1 - r, back_h + 0.5 - r]) circle(r = r);
    }
    translate([sx0 + r, back_h + 0.5 - r]) square([stand_w - 2 * r, r + 30]);
}
// Hintere Fußecken gerundet, Draufsicht (x, y)
module foot_round_2d() {
    r = foot_corner_r;
    translate([sx0 - 10, -10]) square([stand_w + 20, base_d + 10 - r + 0.2]);
    hull() {
        translate([sx0 + r, base_d + 0.2 - r]) circle(r = r);
        translate([sx1 - r, base_d + 0.2 - r]) circle(r = r);
    }
}

module stand() {
    difference() {
        intersection() {
            profile_solid();
            in_dev() rotate([90, 0, 0])
                linear_extrude(height = 400, center = true) top_round_2d();
            translate([0, 0, -1]) linear_extrude(height = bed) foot_round_2d();
        }
        // Steckerschacht mit Fase hinten (R4, R6, R12)
        in_dev() translate([port_x - shaft_l / 2, 0, 0]) rotate([90, 0, 90])
            linear_extrude(height = shaft_l) polygon(SHAFT_NU);
        // Kabelkanal nach hinten, oben offen (R7)
        translate([channel_x - channel_w / 2, channel_y0, channel_z0])
            cube([channel_w, base_d + 1 - channel_y0, bed]);
        // Popsocket-Tasche, oben offen, unten rund (R8)
        in_dev() {
            translate([pop_x, slot_w - 1, pop_u]) rotate([-90, 0, 0])
                cylinder(d = pocket_w, h = pocket_dep + 1);
            translate([pocket_x0, slot_w - 1, pop_u])
                cube([pocket_w, pocket_dep + 1, dev_h]);
        }
    }
}

// Dummies (nicht gedruckt)
module device(g = 0) {
    in_dev() {
        translate([g, n_dev0 + g, g]) cube([dev_w - 2 * g, dev_t - 2 * g, dev_h - 2 * g]);
        translate([pop_x, slot_w + g, pop_u]) rotate([-90, 0, 0])
            cylinder(d = pop_d, h = pop_h - g);
    }
}
module plug() {
    in_dev() translate([port_x - plug_w / 2, n_plug - plug_t / 2, -plug_l])
        cube([plug_w, plug_t, plug_l]);
}
module cable() {
    in_dev() translate([port_x, n_plug, cab_u]) rotate([0, 90, 0])
        cylinder(d = cable_d, h = channel_x - port_x);
    translate([channel_x, cab_P[0], cab_P[1]]) sphere(d = cable_d);
    translate([channel_x, cab_P[0], cab_P[1]]) rotate([-90, 0, 0])
        cylinder(d = cable_d, h = base_d + 20 - cab_P[0]);
}

fx0 = port_x - shaft_l / 2 - 8;
fx1 = port_x + shaft_l / 2 + 8;
fz1 = F(-lip_t, lip_h)[1] + 3;
fy1 = F(n_rear, u_J)[0] + 3;
module fit_test() {
    intersection() {
        stand();
        translate([fx0, -1, -1]) cube([fx1 - fx0, fy1 + 1, fz1 + 1]);
    }
}

if (part == "print") {
    color(col_stand) translate([-sx0, 0, 0]) render(convexity = 6) stand();
} else if (part == "stand") {
    color(col_stand) render(convexity = 6) stand();
} else if (part == "fit_test") {
    color(col_stand) translate([-fx0, 0, 0]) render(convexity = 6) fit_test();
} else if (part == "assembly") {
    color(col_stand) render(convexity = 6) stand();
    color("Gray", 0.6) device();
    color("White") plug();
    color("DimGray") cable();
} else if (part == "interference") {
    // Kontakt Gerät/Auflage/Stütze ist gewollt -> Dummies um 0.05 geschrumpft
    intersection() {
        stand();
        union() { device(0.05); plug(); cable(); }
    }
}
